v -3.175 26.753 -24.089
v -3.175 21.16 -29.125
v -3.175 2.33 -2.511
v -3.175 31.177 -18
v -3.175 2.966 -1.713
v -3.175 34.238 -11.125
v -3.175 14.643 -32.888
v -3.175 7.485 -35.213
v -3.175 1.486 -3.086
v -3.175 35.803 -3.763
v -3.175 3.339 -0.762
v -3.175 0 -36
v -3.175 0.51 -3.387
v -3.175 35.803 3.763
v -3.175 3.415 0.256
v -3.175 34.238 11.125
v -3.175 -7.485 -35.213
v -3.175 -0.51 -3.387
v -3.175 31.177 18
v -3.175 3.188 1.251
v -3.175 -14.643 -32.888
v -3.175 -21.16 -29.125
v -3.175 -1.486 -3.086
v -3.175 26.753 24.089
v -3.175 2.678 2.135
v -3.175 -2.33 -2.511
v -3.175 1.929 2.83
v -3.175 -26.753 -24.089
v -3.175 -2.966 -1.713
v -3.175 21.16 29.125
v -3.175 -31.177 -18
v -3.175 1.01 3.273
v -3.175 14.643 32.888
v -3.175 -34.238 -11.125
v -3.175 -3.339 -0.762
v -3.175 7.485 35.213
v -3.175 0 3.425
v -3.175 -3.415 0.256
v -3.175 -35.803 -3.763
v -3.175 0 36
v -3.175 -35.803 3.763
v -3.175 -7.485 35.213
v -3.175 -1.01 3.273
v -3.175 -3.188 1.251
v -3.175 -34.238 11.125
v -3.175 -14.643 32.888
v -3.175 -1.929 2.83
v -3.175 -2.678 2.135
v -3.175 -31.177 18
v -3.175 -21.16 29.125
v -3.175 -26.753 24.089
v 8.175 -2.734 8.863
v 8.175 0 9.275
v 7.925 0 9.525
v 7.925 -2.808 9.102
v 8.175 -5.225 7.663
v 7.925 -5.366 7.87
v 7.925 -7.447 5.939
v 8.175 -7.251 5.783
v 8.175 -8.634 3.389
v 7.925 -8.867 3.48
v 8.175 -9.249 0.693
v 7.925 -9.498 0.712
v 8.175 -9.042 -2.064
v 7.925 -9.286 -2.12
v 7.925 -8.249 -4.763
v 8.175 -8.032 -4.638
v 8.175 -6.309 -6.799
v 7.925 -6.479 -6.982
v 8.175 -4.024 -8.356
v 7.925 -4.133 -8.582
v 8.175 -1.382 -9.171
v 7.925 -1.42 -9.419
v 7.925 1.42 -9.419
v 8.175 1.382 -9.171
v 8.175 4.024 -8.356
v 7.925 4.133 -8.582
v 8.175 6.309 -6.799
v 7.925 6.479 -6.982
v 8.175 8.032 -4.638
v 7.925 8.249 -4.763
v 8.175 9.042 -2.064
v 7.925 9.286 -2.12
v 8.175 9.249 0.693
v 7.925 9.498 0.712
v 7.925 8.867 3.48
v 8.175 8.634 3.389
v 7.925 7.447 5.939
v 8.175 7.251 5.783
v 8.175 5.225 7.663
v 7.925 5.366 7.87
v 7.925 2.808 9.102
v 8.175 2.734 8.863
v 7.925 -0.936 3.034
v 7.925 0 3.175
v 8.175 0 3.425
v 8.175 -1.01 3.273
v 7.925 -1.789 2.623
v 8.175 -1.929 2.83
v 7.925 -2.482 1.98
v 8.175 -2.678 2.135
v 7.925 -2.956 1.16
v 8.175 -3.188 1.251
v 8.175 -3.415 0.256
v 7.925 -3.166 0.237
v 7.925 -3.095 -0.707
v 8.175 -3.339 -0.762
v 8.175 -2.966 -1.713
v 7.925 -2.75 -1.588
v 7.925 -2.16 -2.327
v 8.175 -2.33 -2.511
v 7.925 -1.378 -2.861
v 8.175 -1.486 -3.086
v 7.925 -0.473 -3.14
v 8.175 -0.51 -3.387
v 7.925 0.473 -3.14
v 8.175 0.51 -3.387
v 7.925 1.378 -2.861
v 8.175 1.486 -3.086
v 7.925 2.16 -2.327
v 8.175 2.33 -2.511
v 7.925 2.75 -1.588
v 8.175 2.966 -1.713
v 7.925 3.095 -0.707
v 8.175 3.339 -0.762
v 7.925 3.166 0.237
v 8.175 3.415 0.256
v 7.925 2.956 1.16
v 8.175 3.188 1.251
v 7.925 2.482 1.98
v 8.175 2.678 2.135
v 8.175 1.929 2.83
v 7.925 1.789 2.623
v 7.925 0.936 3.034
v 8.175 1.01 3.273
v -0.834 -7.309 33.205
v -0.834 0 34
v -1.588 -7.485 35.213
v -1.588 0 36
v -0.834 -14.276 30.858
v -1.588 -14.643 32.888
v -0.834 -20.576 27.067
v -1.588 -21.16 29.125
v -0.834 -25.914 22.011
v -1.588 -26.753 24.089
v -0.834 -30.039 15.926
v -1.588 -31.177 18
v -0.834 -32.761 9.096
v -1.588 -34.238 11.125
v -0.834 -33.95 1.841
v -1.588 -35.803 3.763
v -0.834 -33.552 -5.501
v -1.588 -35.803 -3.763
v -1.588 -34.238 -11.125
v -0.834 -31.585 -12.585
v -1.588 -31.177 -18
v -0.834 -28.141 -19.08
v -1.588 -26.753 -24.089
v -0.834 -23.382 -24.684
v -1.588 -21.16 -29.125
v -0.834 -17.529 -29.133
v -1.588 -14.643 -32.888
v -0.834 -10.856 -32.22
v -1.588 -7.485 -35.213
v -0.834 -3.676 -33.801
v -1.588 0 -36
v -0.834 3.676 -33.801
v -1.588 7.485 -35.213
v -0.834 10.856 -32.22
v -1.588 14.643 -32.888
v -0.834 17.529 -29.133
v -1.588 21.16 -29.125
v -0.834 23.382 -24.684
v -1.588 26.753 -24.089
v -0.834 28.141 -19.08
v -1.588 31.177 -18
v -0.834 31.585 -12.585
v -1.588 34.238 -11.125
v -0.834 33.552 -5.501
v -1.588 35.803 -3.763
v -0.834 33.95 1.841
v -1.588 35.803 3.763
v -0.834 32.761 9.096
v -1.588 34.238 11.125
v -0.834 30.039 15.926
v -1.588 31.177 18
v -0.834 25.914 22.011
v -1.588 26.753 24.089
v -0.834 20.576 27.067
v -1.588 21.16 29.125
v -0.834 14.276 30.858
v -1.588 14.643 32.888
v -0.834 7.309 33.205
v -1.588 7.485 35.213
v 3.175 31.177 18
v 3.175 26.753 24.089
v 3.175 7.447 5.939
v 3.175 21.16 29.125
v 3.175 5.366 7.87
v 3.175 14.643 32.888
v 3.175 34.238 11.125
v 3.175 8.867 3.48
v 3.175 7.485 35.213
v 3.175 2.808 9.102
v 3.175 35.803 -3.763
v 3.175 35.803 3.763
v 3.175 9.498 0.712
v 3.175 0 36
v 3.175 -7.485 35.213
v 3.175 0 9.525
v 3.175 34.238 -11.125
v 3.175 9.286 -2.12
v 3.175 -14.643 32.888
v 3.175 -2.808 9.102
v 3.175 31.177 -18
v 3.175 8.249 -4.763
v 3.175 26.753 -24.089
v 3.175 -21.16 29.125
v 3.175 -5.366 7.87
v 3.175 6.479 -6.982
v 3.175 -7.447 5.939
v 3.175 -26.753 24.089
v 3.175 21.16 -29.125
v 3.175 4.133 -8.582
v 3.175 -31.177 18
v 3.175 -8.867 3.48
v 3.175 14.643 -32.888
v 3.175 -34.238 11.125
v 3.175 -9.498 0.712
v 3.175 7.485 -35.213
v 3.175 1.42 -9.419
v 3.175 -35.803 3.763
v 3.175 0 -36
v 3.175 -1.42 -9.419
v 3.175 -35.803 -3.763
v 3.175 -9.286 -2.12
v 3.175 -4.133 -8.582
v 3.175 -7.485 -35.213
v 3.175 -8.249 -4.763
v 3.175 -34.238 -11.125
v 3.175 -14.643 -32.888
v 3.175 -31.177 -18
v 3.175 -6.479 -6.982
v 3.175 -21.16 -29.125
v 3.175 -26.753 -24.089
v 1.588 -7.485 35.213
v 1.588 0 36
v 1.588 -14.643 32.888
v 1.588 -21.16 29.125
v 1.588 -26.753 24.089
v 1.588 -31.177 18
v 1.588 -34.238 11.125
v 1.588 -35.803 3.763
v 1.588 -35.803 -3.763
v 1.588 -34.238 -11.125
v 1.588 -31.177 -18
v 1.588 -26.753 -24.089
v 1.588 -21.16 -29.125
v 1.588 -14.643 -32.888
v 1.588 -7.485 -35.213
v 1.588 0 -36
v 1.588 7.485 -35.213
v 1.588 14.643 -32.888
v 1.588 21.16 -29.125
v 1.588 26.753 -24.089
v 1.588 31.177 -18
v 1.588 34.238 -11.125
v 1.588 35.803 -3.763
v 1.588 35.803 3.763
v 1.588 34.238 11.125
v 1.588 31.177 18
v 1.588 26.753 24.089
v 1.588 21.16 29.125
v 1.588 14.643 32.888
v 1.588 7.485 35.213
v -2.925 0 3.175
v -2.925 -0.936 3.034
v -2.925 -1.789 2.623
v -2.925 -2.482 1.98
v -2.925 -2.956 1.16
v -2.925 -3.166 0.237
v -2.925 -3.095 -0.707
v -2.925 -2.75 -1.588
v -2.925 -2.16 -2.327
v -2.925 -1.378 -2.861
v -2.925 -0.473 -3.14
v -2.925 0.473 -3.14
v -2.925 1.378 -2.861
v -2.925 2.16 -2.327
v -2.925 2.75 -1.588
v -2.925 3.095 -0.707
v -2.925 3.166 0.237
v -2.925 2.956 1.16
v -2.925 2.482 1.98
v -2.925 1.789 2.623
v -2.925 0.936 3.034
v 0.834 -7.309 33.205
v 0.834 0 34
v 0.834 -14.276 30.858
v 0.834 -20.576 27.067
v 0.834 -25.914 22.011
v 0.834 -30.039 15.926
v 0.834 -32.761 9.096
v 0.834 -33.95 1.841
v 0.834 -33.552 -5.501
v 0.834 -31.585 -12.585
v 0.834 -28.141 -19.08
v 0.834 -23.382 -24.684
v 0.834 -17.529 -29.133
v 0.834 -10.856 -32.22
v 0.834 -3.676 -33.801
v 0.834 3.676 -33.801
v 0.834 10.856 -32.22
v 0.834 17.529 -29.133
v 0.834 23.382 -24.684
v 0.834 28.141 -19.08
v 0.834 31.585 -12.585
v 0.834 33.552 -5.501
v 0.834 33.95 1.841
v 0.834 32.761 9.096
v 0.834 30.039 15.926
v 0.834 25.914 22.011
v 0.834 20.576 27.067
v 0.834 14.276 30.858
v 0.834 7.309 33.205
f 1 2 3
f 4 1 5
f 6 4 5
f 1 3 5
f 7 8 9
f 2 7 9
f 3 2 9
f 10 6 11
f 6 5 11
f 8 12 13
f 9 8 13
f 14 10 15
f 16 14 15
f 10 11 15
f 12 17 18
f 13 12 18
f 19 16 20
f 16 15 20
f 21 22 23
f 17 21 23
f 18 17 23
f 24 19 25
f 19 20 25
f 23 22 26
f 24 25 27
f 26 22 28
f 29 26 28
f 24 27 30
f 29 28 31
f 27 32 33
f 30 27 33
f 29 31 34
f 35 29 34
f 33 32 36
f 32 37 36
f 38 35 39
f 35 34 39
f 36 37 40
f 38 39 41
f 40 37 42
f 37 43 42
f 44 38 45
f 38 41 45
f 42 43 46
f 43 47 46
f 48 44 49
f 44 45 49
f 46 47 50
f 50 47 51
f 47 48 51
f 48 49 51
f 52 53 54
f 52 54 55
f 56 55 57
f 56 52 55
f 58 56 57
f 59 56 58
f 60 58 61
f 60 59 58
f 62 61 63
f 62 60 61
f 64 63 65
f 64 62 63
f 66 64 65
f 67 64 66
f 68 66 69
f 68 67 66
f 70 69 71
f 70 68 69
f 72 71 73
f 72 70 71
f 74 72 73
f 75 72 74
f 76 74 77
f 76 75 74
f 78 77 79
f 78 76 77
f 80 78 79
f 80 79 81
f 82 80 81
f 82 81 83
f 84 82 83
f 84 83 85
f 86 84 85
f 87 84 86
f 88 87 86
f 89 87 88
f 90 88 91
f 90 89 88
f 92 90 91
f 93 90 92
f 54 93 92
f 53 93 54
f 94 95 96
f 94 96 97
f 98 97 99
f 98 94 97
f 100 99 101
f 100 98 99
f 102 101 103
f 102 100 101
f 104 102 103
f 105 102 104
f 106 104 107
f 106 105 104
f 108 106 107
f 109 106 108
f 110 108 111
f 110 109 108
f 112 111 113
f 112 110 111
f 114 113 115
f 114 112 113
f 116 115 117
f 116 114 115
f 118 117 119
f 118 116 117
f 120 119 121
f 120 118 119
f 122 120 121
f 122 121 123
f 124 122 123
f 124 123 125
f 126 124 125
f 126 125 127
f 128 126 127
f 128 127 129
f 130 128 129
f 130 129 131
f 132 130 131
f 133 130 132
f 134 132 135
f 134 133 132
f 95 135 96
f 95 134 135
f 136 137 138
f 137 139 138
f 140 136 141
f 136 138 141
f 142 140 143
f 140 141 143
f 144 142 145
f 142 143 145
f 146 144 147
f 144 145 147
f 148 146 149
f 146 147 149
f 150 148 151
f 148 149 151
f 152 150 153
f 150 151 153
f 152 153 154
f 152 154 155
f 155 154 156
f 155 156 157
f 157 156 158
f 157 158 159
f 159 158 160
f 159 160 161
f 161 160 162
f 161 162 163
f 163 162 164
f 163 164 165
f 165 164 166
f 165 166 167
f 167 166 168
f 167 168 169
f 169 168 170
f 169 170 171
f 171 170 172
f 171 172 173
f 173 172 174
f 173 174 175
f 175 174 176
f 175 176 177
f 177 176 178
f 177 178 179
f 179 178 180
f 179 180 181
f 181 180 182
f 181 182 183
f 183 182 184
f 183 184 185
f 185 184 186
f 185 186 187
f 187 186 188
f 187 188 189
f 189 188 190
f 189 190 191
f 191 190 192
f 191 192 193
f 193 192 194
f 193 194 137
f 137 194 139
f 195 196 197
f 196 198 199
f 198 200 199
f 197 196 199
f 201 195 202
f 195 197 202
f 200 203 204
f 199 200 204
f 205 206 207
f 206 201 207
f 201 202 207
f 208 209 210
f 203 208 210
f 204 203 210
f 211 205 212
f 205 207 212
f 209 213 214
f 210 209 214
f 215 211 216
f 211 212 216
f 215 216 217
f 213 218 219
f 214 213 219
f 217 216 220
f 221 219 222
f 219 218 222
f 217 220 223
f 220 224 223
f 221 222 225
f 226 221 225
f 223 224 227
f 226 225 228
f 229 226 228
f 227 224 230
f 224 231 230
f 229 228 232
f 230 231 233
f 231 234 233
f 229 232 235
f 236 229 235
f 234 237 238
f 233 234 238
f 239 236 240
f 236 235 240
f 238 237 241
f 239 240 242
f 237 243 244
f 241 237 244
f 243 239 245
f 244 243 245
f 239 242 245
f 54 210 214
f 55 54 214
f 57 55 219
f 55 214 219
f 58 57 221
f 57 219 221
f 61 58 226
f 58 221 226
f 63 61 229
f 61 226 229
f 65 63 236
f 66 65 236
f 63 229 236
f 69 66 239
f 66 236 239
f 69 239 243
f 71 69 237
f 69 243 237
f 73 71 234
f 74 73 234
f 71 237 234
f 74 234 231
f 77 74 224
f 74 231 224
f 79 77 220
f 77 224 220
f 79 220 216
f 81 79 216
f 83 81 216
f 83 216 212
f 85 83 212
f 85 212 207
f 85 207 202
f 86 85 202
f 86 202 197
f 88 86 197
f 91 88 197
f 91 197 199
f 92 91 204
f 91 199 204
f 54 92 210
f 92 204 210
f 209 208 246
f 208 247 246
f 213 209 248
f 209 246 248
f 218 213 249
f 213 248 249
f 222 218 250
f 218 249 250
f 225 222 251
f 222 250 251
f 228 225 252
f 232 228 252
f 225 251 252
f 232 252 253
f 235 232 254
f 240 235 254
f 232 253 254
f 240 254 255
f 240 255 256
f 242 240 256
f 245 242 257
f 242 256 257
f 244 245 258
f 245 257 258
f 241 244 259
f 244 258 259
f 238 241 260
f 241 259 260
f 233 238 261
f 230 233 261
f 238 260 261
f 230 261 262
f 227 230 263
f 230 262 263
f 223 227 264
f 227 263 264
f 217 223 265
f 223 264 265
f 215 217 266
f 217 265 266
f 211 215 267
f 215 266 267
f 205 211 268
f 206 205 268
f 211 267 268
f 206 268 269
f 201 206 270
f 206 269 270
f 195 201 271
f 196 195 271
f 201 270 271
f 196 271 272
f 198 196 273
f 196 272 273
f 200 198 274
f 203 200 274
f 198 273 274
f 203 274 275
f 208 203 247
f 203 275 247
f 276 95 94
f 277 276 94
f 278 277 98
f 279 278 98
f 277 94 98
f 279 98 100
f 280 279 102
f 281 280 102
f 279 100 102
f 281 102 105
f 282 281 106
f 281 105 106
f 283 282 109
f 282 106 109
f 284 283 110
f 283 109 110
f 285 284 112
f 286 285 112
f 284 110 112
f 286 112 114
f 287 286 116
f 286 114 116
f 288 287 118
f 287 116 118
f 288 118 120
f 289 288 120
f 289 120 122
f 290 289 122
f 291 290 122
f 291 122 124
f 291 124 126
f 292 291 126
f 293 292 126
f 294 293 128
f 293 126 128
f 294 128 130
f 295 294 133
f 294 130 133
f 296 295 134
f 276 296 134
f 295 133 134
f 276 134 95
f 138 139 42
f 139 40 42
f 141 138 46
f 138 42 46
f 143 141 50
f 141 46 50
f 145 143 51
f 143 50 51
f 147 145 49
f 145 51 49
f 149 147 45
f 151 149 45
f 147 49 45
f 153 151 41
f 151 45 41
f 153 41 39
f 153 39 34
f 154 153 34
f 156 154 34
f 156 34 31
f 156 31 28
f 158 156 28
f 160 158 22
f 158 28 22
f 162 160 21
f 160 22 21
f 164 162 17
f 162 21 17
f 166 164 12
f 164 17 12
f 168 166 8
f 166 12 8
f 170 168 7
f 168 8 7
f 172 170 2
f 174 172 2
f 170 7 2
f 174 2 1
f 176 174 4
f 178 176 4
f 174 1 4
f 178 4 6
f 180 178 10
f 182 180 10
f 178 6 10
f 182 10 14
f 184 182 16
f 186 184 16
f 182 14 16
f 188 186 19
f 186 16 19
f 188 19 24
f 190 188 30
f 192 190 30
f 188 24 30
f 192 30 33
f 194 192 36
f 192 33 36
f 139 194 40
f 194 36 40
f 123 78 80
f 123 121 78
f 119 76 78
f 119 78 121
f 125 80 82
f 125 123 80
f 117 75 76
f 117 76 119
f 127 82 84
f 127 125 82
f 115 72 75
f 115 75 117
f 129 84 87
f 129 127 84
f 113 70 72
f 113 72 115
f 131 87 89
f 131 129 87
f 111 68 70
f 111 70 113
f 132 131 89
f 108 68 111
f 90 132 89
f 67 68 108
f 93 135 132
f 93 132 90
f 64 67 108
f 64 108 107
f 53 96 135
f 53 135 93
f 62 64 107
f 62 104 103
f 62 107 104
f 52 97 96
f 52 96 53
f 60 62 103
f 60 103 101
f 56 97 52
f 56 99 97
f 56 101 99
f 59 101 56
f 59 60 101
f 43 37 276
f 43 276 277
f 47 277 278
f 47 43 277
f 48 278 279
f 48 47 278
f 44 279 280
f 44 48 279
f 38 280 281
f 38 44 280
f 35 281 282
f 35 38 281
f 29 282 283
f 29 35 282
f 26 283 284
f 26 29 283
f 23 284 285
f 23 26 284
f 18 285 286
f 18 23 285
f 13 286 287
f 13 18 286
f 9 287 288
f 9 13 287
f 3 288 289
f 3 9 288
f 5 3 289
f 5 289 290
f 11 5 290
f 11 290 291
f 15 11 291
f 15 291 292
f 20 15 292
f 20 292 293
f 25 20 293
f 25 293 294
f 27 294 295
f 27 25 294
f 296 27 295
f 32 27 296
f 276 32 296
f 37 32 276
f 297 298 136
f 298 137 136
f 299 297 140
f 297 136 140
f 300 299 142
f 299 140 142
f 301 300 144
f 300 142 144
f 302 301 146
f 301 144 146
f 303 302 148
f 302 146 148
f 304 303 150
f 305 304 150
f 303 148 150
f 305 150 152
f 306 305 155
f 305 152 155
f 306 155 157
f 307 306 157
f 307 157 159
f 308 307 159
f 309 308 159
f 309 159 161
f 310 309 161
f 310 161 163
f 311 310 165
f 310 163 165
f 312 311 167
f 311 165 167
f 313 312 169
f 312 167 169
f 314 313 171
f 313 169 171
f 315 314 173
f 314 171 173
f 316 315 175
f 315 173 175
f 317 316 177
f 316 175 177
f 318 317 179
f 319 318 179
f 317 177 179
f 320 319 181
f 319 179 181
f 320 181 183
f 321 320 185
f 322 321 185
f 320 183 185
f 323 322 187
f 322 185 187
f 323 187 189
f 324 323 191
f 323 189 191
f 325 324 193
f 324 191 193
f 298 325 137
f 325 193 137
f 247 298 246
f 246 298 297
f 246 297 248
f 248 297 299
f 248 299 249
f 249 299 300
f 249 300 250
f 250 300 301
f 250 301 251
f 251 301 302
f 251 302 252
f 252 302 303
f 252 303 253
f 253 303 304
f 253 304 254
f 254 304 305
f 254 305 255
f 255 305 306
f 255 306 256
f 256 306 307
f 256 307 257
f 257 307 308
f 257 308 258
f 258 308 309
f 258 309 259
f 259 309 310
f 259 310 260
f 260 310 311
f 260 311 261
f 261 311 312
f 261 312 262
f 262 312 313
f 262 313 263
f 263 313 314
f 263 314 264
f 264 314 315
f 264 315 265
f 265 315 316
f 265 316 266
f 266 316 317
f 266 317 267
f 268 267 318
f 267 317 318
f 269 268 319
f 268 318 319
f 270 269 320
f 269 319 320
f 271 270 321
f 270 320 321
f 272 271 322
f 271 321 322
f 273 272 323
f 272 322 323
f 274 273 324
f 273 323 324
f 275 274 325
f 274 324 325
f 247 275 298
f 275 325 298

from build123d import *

# Parameters (mm, degrees)
SKETCH3_R           = 9.525
BOSS_EXTRUDE1_DEPTH = 5
SKETCH4_R           = 3.175
CUT_EXTRUDE1_DEPTH  = 53.161504004
CHAMFER1_SIZE       = 0.25


with BuildPart() as part:
    # Sketch2 → Revolve1 (revolve)
    with BuildSketch(Plane.XY, mode=Mode.PRIVATE) as revolve1_sk:
        Polygon((-3.175, 3.175), (3.175, 3.175), (3.175, 36), (1.5875, 36), (0.833641219, 34), (-0.833641219, 34), (-1.5875, 36), (-3.175, 36), align=None)
    revolve(revolve1_sk.sketch.rotate(Axis((0, 0, 0), (1, 0, 0)), 90), axis=Axis((0, 0, 0), (1, 0, 0)))

    # Sketch3 → Boss-Extrude1 (add)
    with BuildSketch(Plane(origin=(3.175, 0, 0), x_dir=(0, 0, -1), z_dir=(1, 0, 0))):
        with Locations(Location((0, 0, 0), (0, 0, 180))):
            Circle(SKETCH3_R)
    extrude(amount=BOSS_EXTRUDE1_DEPTH)

    # Sketch4 → Cut-Extrude1 (cut, through all)
    with BuildSketch(Plane(origin=(8.175, 0, 0), x_dir=(0, 0, -1), z_dir=(1, 0, 0))):
        with Locations(Location((0, 0, 0), (0, 0, 180))):
            Circle(SKETCH4_R)
    extrude(amount=-CUT_EXTRUDE1_DEPTH, mode=Mode.SUBTRACT)

    # Chamfer1
    chamfer1_edges = [part.edges().sort_by_distance(p)[0] for p in [
        (8.175, 0, -9.525),
        (8.175, 0, -3.175),
        (-3.175, 0, -3.175),
    ]]
    chamfer(chamfer1_edges, length=CHAMFER1_SIZE)


solid = part.part
